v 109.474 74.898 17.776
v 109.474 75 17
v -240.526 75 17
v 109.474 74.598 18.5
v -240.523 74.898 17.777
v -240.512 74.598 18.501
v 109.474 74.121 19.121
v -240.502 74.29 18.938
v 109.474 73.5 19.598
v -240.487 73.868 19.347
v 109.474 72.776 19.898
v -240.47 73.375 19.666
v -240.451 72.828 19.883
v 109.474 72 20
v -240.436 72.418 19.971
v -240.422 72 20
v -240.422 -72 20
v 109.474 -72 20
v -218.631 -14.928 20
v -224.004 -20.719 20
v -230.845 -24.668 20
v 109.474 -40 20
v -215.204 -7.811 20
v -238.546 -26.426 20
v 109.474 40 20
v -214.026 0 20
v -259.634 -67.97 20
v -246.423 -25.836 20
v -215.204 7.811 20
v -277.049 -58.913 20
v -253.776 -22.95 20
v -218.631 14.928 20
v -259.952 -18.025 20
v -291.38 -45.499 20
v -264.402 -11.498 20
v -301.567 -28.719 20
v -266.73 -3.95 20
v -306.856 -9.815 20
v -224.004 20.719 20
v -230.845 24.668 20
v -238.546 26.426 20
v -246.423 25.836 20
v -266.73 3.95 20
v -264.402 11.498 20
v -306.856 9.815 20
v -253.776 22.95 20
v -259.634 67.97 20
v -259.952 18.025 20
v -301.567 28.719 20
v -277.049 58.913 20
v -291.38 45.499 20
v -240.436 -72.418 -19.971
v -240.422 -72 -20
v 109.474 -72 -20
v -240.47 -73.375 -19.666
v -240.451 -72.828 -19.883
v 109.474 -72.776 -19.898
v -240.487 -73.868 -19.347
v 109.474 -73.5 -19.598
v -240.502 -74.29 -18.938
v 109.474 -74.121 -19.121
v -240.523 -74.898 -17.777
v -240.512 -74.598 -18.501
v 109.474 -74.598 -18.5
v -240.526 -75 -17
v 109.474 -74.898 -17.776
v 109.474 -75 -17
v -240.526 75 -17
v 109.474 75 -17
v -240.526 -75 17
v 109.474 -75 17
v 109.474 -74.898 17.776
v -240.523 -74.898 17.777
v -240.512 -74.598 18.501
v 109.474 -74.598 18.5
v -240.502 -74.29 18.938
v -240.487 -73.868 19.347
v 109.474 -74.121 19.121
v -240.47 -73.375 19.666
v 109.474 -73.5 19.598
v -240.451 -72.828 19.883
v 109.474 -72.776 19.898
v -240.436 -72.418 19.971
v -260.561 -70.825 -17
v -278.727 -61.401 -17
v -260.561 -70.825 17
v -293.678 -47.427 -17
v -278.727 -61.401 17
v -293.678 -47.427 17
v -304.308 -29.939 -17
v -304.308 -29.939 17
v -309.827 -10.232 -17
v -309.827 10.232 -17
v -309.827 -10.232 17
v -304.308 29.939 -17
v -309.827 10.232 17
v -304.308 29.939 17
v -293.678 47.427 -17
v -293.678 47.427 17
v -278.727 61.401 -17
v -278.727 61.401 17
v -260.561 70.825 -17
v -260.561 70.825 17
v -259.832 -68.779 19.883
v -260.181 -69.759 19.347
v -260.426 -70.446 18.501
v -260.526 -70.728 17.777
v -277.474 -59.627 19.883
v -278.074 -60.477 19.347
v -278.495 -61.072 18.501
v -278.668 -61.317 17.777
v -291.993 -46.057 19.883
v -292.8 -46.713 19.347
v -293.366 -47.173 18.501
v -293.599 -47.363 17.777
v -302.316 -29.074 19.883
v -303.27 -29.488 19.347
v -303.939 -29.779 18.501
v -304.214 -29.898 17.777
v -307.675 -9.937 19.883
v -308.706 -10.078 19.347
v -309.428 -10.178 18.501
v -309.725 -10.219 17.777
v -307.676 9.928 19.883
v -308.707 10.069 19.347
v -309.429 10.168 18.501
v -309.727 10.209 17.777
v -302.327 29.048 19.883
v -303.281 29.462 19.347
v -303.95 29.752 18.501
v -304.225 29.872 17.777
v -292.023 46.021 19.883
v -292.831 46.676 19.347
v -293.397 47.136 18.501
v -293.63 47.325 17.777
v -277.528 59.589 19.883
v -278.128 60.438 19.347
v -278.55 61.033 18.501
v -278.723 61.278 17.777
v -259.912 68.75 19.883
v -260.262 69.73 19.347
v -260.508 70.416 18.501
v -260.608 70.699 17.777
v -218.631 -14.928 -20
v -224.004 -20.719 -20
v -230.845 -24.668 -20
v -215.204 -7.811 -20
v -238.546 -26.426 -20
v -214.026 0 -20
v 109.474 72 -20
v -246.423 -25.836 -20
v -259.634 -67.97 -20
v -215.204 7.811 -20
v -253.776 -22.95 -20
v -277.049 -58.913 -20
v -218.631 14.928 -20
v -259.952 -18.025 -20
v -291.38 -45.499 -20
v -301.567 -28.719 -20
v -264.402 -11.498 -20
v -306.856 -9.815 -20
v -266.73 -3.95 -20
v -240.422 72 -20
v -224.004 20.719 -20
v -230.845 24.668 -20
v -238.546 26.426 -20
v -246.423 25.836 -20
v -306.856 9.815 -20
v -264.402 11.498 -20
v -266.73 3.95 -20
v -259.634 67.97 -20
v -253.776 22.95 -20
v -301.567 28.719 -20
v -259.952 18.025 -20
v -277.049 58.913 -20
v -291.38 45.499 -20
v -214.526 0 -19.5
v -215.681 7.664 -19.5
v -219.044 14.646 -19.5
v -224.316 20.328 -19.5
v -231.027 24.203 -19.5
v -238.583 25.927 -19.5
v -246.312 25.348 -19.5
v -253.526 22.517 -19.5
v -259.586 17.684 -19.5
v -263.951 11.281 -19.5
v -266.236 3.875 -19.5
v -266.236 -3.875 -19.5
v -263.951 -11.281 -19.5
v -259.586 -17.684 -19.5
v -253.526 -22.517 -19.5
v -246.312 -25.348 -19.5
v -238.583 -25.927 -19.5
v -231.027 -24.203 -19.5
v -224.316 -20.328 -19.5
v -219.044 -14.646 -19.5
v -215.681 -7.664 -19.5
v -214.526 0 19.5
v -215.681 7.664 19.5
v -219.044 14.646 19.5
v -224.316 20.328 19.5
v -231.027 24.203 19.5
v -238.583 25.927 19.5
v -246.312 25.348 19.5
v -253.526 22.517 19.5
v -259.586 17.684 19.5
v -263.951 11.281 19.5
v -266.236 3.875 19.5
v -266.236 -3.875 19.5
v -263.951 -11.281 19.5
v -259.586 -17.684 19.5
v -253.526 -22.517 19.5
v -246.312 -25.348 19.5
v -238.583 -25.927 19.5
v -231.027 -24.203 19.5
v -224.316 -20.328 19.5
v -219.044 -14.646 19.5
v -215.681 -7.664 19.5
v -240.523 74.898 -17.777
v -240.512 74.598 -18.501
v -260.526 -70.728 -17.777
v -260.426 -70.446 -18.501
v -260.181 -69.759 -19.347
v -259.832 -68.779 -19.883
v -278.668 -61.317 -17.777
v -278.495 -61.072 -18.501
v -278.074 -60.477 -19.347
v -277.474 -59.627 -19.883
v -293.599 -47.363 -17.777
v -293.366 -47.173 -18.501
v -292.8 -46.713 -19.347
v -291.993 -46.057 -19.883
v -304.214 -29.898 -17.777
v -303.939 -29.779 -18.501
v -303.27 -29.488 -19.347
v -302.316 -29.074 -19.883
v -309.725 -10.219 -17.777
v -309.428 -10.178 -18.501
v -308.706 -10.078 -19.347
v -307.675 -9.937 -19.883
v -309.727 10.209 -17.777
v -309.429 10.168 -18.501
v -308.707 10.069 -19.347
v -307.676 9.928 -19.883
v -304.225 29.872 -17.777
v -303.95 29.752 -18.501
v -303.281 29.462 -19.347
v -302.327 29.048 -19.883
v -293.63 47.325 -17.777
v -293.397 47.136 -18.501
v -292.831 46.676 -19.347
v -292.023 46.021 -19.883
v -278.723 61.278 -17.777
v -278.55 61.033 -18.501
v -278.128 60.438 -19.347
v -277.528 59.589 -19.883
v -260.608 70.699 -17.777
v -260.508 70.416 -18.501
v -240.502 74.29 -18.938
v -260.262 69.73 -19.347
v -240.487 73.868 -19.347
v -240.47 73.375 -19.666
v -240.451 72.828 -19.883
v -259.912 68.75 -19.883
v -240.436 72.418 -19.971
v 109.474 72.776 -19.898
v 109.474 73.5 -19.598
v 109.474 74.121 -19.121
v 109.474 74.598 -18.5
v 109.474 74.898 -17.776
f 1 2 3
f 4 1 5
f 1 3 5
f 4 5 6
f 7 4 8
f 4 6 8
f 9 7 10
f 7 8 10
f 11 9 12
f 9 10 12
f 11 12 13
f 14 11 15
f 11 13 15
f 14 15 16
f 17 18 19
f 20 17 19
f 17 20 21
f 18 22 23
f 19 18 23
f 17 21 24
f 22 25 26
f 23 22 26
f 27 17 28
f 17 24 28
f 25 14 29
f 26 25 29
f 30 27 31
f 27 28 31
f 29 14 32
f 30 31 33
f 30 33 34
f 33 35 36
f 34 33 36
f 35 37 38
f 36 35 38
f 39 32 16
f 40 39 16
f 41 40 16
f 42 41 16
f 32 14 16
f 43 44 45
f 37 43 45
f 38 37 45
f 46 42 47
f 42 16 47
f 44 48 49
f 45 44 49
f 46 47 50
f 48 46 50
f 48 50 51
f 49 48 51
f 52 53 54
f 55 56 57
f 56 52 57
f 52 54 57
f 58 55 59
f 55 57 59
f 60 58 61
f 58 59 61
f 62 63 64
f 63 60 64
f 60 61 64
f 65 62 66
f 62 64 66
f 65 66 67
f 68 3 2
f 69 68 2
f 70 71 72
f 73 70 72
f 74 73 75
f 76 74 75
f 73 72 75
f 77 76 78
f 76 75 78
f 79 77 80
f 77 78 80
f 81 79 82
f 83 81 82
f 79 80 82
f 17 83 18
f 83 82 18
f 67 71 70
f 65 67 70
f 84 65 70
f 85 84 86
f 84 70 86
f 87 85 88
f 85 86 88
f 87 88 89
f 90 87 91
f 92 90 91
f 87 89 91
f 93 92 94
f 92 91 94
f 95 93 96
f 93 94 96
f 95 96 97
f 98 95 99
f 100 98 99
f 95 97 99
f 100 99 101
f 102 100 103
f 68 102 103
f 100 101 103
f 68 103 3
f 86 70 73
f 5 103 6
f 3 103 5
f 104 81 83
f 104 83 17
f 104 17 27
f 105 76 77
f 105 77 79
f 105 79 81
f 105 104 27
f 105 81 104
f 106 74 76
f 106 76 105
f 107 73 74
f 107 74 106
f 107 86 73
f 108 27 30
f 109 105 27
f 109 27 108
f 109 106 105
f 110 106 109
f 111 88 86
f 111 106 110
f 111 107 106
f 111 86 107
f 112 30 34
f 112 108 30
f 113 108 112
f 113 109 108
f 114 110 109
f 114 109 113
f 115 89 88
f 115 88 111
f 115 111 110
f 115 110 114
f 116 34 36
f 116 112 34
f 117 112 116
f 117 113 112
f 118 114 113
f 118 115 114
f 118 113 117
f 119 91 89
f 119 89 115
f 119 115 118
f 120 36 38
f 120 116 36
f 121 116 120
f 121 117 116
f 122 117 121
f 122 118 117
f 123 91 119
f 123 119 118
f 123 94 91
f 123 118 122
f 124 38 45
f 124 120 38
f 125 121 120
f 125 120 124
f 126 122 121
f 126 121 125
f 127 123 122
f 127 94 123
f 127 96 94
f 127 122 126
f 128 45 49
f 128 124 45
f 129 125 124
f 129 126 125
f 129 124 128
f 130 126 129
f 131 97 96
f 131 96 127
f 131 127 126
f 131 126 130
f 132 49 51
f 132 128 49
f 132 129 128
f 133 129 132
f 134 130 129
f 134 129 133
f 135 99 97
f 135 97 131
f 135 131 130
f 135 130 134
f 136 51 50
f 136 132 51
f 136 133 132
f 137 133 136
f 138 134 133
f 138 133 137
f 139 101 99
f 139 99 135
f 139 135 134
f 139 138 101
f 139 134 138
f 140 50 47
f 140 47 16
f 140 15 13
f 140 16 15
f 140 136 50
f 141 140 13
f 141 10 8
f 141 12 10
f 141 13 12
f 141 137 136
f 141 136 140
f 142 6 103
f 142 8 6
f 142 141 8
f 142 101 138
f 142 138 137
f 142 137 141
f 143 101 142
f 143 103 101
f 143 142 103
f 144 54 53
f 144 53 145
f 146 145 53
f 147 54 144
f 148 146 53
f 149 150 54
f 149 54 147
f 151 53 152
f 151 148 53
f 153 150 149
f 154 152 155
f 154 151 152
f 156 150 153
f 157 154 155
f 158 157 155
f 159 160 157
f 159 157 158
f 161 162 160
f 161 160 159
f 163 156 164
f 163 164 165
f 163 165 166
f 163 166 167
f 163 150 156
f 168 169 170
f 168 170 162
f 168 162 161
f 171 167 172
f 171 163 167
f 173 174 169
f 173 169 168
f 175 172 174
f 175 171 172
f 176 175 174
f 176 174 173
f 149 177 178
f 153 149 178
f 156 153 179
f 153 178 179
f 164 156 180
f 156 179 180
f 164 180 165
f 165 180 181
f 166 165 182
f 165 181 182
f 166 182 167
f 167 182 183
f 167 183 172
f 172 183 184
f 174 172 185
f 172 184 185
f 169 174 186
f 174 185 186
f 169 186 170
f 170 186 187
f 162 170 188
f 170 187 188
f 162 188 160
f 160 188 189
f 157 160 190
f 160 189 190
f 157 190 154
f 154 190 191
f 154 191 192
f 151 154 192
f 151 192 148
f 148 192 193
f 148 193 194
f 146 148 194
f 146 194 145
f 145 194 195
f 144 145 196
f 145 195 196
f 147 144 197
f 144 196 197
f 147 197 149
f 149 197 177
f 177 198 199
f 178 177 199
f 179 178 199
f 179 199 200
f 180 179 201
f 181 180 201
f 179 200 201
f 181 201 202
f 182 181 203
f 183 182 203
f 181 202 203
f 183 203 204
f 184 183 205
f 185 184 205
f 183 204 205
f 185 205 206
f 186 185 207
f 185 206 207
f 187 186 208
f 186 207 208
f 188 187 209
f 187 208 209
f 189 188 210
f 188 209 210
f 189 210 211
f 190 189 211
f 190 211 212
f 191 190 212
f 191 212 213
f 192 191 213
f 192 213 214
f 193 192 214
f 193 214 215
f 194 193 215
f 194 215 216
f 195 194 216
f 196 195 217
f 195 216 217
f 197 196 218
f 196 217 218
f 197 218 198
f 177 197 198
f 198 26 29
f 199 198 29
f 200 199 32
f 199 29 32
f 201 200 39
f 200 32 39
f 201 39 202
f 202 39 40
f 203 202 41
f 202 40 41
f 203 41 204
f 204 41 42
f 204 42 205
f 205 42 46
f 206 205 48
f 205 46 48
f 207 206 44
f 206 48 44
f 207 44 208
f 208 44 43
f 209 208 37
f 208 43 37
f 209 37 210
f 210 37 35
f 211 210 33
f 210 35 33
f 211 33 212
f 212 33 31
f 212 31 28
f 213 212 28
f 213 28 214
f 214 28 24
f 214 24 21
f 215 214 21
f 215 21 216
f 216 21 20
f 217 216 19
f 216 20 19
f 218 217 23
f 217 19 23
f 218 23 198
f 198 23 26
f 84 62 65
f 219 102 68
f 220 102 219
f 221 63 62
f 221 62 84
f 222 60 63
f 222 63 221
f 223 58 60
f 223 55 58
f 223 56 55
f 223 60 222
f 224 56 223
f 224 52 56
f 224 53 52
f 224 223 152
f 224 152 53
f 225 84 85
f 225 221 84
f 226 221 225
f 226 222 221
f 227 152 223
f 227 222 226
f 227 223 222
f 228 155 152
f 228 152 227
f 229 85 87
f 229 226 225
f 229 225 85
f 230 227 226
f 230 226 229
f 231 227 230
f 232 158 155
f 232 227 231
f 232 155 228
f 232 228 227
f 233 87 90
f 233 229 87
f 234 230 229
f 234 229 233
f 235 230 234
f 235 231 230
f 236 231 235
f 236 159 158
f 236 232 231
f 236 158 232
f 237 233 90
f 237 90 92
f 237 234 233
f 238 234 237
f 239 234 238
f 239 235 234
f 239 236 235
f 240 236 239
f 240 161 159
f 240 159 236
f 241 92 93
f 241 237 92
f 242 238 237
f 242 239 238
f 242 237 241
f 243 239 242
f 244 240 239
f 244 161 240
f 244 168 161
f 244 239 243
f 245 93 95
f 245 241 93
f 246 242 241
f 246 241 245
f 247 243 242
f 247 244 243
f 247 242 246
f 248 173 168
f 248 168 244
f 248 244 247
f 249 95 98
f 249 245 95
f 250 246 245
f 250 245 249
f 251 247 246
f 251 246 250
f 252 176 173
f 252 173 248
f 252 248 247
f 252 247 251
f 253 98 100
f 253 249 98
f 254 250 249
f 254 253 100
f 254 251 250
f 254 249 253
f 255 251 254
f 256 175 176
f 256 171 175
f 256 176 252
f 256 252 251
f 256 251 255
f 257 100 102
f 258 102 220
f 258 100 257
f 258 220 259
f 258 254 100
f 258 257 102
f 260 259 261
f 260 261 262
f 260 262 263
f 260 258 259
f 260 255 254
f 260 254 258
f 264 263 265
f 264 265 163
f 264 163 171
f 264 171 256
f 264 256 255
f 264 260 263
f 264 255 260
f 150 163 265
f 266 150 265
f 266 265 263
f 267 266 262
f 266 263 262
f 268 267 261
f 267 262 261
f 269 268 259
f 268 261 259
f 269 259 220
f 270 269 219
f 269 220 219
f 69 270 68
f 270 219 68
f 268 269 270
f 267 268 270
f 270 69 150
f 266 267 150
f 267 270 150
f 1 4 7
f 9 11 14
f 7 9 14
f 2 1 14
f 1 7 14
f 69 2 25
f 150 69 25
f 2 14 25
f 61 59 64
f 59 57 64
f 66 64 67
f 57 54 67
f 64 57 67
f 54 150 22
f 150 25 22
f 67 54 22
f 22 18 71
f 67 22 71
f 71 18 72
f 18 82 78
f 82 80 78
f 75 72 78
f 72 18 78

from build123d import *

# Parameters (mm, degrees)
BOSS_EXTRUDE1_DEPTH = 20
SKETCH2_R           = 26
CUT_EXTRUDE1_DEPTH  = 40
SKETCH3_W           = 155.054117715
SKETCH3_H           = 119.807274711
BOSS_EXTRUDE2_DEPTH = 40
FILLET1_R           = 3
CHAMFER1_SIZE       = 0.5


with BuildPart() as part:
    # Sketch1 → Boss-Extrude1 (new, symmetric)
    with BuildSketch(Plane.XY):
        with BuildLine():
            Line((-240.526269825, 75), (109.473730175, 75))
            Line((109.473730175, 75), (109.473730175, 40))
            Line((109.473730175, 40), (-20.526269825, 40))
            Line((-20.526269825, 40), (-20.526269825, -40))
            Line((-20.526269825, -40), (109.473730175, -40))
            Line((109.473730175, -40), (109.473730175, -75))
            Line((109.473730175, -75), (-240.526269825, -75))
            ThreePointArc((-240.526269825, -75), (-310.526269825, 0), (-240.526269825, 75))
        make_face()
    extrude(amount=BOSS_EXTRUDE1_DEPTH, both=True)

    # Sketch2 → Cut-Extrude1 (cut)
    with BuildSketch(Plane.XY.offset(20)):
        with Locations((-240.526269825, 0)):
            Circle(SKETCH2_R)
    extrude(amount=-CUT_EXTRUDE1_DEPTH, mode=Mode.SUBTRACT)

    # Sketch3 → Boss-Extrude2 (add, through all)
    with BuildSketch(Plane.XY.offset(20)):
        with Locations((31.946671317, -2.166338184)):
            Rectangle(SKETCH3_W, SKETCH3_H)
    extrude(amount=-BOSS_EXTRUDE2_DEPTH)

    # Fillet1
    # the kernel refuses this fillet: 3 mm, written as the material it takes off along each edge
    with BuildSketch(Plane(origin=(116.973730175, -75, -20), x_dir=(0, 0, 1), z_dir=(-1, 0, 0)), Plane(origin=(116.973730175, -75, 20), x_dir=(0, 1, 0), z_dir=(-1, 0, 0)), Plane(origin=(-248.026269825, 75, -20), x_dir=(0, 0, 1), z_dir=(1, 0, 0))) as fillet1_piece_1:
        with BuildLine():
            CenterArc((FILLET1_R, FILLET1_R), FILLET1_R, 180, 90)
            Line((0, FILLET1_R), (0, 0))
            Line((0, 0), (FILLET1_R, 0))
        make_face()
    extrude(amount=365, mode=Mode.SUBTRACT)
    with BuildSketch(Plane(origin=(-235.347698397, 0, -20), x_dir=(0.03096596678063506, -0.9995204394615153, 0), z_dir=(0.9995204394615153, 0.03096596678063506, 0))) as fillet1_piece_2:
        with BuildLine():
            CenterArc((75.178571429 - FILLET1_R, -FILLET1_R), FILLET1_R, 0, 90)
            Line((75.178571429, -FILLET1_R), (75.178571429, 0))
            Line((75.178571429, 0), (75.178571429 - FILLET1_R, 0))
        make_face()
    revolve(axis=Axis((-235.347698397, 0, -20), (0, 0, -1)), revolution_arc=183.549005749, mode=Mode.SUBTRACT)
    with BuildSketch(Plane(origin=(-248.026269825, 75, 20), x_dir=(0, 0, -1), z_dir=(1, 0, 0))) as fillet1_piece_3:
        with BuildLine():
            CenterArc((FILLET1_R, -FILLET1_R), FILLET1_R, 90, 90)
            Line((0, -FILLET1_R), (0, 0))
            Line((0, 0), (FILLET1_R, 0))
        make_face()
    extrude(amount=365, mode=Mode.SUBTRACT)
    with BuildSketch(Plane(origin=(-235.347698397, 0, 20), x_dir=(0.03096596678063506, -0.9995204394615153, 0), z_dir=(0.9995204394615153, 0.03096596678063506, 0))) as fillet1_piece_4:
        with BuildLine():
            CenterArc((75.178571429 - FILLET1_R, FILLET1_R), FILLET1_R, 270, 90)
            Line((75.178571429, FILLET1_R), (75.178571429, 0))
            Line((75.178571429, 0), (75.178571429 - FILLET1_R, 0))
        make_face()
    revolve(axis=Axis((-235.347698397, 0, 20), (0, 0, -1)), revolution_arc=183.549005749, mode=Mode.SUBTRACT)

    # Chamfer1
    chamfer1_edges = [part.edges().sort_by_distance(p)[0] for p in [
        (-266.526269825, 0, -20),
        (-266.526269825, 0, 20),
    ]]
    chamfer(chamfer1_edges, length=CHAMFER1_SIZE)


solid = part.part
